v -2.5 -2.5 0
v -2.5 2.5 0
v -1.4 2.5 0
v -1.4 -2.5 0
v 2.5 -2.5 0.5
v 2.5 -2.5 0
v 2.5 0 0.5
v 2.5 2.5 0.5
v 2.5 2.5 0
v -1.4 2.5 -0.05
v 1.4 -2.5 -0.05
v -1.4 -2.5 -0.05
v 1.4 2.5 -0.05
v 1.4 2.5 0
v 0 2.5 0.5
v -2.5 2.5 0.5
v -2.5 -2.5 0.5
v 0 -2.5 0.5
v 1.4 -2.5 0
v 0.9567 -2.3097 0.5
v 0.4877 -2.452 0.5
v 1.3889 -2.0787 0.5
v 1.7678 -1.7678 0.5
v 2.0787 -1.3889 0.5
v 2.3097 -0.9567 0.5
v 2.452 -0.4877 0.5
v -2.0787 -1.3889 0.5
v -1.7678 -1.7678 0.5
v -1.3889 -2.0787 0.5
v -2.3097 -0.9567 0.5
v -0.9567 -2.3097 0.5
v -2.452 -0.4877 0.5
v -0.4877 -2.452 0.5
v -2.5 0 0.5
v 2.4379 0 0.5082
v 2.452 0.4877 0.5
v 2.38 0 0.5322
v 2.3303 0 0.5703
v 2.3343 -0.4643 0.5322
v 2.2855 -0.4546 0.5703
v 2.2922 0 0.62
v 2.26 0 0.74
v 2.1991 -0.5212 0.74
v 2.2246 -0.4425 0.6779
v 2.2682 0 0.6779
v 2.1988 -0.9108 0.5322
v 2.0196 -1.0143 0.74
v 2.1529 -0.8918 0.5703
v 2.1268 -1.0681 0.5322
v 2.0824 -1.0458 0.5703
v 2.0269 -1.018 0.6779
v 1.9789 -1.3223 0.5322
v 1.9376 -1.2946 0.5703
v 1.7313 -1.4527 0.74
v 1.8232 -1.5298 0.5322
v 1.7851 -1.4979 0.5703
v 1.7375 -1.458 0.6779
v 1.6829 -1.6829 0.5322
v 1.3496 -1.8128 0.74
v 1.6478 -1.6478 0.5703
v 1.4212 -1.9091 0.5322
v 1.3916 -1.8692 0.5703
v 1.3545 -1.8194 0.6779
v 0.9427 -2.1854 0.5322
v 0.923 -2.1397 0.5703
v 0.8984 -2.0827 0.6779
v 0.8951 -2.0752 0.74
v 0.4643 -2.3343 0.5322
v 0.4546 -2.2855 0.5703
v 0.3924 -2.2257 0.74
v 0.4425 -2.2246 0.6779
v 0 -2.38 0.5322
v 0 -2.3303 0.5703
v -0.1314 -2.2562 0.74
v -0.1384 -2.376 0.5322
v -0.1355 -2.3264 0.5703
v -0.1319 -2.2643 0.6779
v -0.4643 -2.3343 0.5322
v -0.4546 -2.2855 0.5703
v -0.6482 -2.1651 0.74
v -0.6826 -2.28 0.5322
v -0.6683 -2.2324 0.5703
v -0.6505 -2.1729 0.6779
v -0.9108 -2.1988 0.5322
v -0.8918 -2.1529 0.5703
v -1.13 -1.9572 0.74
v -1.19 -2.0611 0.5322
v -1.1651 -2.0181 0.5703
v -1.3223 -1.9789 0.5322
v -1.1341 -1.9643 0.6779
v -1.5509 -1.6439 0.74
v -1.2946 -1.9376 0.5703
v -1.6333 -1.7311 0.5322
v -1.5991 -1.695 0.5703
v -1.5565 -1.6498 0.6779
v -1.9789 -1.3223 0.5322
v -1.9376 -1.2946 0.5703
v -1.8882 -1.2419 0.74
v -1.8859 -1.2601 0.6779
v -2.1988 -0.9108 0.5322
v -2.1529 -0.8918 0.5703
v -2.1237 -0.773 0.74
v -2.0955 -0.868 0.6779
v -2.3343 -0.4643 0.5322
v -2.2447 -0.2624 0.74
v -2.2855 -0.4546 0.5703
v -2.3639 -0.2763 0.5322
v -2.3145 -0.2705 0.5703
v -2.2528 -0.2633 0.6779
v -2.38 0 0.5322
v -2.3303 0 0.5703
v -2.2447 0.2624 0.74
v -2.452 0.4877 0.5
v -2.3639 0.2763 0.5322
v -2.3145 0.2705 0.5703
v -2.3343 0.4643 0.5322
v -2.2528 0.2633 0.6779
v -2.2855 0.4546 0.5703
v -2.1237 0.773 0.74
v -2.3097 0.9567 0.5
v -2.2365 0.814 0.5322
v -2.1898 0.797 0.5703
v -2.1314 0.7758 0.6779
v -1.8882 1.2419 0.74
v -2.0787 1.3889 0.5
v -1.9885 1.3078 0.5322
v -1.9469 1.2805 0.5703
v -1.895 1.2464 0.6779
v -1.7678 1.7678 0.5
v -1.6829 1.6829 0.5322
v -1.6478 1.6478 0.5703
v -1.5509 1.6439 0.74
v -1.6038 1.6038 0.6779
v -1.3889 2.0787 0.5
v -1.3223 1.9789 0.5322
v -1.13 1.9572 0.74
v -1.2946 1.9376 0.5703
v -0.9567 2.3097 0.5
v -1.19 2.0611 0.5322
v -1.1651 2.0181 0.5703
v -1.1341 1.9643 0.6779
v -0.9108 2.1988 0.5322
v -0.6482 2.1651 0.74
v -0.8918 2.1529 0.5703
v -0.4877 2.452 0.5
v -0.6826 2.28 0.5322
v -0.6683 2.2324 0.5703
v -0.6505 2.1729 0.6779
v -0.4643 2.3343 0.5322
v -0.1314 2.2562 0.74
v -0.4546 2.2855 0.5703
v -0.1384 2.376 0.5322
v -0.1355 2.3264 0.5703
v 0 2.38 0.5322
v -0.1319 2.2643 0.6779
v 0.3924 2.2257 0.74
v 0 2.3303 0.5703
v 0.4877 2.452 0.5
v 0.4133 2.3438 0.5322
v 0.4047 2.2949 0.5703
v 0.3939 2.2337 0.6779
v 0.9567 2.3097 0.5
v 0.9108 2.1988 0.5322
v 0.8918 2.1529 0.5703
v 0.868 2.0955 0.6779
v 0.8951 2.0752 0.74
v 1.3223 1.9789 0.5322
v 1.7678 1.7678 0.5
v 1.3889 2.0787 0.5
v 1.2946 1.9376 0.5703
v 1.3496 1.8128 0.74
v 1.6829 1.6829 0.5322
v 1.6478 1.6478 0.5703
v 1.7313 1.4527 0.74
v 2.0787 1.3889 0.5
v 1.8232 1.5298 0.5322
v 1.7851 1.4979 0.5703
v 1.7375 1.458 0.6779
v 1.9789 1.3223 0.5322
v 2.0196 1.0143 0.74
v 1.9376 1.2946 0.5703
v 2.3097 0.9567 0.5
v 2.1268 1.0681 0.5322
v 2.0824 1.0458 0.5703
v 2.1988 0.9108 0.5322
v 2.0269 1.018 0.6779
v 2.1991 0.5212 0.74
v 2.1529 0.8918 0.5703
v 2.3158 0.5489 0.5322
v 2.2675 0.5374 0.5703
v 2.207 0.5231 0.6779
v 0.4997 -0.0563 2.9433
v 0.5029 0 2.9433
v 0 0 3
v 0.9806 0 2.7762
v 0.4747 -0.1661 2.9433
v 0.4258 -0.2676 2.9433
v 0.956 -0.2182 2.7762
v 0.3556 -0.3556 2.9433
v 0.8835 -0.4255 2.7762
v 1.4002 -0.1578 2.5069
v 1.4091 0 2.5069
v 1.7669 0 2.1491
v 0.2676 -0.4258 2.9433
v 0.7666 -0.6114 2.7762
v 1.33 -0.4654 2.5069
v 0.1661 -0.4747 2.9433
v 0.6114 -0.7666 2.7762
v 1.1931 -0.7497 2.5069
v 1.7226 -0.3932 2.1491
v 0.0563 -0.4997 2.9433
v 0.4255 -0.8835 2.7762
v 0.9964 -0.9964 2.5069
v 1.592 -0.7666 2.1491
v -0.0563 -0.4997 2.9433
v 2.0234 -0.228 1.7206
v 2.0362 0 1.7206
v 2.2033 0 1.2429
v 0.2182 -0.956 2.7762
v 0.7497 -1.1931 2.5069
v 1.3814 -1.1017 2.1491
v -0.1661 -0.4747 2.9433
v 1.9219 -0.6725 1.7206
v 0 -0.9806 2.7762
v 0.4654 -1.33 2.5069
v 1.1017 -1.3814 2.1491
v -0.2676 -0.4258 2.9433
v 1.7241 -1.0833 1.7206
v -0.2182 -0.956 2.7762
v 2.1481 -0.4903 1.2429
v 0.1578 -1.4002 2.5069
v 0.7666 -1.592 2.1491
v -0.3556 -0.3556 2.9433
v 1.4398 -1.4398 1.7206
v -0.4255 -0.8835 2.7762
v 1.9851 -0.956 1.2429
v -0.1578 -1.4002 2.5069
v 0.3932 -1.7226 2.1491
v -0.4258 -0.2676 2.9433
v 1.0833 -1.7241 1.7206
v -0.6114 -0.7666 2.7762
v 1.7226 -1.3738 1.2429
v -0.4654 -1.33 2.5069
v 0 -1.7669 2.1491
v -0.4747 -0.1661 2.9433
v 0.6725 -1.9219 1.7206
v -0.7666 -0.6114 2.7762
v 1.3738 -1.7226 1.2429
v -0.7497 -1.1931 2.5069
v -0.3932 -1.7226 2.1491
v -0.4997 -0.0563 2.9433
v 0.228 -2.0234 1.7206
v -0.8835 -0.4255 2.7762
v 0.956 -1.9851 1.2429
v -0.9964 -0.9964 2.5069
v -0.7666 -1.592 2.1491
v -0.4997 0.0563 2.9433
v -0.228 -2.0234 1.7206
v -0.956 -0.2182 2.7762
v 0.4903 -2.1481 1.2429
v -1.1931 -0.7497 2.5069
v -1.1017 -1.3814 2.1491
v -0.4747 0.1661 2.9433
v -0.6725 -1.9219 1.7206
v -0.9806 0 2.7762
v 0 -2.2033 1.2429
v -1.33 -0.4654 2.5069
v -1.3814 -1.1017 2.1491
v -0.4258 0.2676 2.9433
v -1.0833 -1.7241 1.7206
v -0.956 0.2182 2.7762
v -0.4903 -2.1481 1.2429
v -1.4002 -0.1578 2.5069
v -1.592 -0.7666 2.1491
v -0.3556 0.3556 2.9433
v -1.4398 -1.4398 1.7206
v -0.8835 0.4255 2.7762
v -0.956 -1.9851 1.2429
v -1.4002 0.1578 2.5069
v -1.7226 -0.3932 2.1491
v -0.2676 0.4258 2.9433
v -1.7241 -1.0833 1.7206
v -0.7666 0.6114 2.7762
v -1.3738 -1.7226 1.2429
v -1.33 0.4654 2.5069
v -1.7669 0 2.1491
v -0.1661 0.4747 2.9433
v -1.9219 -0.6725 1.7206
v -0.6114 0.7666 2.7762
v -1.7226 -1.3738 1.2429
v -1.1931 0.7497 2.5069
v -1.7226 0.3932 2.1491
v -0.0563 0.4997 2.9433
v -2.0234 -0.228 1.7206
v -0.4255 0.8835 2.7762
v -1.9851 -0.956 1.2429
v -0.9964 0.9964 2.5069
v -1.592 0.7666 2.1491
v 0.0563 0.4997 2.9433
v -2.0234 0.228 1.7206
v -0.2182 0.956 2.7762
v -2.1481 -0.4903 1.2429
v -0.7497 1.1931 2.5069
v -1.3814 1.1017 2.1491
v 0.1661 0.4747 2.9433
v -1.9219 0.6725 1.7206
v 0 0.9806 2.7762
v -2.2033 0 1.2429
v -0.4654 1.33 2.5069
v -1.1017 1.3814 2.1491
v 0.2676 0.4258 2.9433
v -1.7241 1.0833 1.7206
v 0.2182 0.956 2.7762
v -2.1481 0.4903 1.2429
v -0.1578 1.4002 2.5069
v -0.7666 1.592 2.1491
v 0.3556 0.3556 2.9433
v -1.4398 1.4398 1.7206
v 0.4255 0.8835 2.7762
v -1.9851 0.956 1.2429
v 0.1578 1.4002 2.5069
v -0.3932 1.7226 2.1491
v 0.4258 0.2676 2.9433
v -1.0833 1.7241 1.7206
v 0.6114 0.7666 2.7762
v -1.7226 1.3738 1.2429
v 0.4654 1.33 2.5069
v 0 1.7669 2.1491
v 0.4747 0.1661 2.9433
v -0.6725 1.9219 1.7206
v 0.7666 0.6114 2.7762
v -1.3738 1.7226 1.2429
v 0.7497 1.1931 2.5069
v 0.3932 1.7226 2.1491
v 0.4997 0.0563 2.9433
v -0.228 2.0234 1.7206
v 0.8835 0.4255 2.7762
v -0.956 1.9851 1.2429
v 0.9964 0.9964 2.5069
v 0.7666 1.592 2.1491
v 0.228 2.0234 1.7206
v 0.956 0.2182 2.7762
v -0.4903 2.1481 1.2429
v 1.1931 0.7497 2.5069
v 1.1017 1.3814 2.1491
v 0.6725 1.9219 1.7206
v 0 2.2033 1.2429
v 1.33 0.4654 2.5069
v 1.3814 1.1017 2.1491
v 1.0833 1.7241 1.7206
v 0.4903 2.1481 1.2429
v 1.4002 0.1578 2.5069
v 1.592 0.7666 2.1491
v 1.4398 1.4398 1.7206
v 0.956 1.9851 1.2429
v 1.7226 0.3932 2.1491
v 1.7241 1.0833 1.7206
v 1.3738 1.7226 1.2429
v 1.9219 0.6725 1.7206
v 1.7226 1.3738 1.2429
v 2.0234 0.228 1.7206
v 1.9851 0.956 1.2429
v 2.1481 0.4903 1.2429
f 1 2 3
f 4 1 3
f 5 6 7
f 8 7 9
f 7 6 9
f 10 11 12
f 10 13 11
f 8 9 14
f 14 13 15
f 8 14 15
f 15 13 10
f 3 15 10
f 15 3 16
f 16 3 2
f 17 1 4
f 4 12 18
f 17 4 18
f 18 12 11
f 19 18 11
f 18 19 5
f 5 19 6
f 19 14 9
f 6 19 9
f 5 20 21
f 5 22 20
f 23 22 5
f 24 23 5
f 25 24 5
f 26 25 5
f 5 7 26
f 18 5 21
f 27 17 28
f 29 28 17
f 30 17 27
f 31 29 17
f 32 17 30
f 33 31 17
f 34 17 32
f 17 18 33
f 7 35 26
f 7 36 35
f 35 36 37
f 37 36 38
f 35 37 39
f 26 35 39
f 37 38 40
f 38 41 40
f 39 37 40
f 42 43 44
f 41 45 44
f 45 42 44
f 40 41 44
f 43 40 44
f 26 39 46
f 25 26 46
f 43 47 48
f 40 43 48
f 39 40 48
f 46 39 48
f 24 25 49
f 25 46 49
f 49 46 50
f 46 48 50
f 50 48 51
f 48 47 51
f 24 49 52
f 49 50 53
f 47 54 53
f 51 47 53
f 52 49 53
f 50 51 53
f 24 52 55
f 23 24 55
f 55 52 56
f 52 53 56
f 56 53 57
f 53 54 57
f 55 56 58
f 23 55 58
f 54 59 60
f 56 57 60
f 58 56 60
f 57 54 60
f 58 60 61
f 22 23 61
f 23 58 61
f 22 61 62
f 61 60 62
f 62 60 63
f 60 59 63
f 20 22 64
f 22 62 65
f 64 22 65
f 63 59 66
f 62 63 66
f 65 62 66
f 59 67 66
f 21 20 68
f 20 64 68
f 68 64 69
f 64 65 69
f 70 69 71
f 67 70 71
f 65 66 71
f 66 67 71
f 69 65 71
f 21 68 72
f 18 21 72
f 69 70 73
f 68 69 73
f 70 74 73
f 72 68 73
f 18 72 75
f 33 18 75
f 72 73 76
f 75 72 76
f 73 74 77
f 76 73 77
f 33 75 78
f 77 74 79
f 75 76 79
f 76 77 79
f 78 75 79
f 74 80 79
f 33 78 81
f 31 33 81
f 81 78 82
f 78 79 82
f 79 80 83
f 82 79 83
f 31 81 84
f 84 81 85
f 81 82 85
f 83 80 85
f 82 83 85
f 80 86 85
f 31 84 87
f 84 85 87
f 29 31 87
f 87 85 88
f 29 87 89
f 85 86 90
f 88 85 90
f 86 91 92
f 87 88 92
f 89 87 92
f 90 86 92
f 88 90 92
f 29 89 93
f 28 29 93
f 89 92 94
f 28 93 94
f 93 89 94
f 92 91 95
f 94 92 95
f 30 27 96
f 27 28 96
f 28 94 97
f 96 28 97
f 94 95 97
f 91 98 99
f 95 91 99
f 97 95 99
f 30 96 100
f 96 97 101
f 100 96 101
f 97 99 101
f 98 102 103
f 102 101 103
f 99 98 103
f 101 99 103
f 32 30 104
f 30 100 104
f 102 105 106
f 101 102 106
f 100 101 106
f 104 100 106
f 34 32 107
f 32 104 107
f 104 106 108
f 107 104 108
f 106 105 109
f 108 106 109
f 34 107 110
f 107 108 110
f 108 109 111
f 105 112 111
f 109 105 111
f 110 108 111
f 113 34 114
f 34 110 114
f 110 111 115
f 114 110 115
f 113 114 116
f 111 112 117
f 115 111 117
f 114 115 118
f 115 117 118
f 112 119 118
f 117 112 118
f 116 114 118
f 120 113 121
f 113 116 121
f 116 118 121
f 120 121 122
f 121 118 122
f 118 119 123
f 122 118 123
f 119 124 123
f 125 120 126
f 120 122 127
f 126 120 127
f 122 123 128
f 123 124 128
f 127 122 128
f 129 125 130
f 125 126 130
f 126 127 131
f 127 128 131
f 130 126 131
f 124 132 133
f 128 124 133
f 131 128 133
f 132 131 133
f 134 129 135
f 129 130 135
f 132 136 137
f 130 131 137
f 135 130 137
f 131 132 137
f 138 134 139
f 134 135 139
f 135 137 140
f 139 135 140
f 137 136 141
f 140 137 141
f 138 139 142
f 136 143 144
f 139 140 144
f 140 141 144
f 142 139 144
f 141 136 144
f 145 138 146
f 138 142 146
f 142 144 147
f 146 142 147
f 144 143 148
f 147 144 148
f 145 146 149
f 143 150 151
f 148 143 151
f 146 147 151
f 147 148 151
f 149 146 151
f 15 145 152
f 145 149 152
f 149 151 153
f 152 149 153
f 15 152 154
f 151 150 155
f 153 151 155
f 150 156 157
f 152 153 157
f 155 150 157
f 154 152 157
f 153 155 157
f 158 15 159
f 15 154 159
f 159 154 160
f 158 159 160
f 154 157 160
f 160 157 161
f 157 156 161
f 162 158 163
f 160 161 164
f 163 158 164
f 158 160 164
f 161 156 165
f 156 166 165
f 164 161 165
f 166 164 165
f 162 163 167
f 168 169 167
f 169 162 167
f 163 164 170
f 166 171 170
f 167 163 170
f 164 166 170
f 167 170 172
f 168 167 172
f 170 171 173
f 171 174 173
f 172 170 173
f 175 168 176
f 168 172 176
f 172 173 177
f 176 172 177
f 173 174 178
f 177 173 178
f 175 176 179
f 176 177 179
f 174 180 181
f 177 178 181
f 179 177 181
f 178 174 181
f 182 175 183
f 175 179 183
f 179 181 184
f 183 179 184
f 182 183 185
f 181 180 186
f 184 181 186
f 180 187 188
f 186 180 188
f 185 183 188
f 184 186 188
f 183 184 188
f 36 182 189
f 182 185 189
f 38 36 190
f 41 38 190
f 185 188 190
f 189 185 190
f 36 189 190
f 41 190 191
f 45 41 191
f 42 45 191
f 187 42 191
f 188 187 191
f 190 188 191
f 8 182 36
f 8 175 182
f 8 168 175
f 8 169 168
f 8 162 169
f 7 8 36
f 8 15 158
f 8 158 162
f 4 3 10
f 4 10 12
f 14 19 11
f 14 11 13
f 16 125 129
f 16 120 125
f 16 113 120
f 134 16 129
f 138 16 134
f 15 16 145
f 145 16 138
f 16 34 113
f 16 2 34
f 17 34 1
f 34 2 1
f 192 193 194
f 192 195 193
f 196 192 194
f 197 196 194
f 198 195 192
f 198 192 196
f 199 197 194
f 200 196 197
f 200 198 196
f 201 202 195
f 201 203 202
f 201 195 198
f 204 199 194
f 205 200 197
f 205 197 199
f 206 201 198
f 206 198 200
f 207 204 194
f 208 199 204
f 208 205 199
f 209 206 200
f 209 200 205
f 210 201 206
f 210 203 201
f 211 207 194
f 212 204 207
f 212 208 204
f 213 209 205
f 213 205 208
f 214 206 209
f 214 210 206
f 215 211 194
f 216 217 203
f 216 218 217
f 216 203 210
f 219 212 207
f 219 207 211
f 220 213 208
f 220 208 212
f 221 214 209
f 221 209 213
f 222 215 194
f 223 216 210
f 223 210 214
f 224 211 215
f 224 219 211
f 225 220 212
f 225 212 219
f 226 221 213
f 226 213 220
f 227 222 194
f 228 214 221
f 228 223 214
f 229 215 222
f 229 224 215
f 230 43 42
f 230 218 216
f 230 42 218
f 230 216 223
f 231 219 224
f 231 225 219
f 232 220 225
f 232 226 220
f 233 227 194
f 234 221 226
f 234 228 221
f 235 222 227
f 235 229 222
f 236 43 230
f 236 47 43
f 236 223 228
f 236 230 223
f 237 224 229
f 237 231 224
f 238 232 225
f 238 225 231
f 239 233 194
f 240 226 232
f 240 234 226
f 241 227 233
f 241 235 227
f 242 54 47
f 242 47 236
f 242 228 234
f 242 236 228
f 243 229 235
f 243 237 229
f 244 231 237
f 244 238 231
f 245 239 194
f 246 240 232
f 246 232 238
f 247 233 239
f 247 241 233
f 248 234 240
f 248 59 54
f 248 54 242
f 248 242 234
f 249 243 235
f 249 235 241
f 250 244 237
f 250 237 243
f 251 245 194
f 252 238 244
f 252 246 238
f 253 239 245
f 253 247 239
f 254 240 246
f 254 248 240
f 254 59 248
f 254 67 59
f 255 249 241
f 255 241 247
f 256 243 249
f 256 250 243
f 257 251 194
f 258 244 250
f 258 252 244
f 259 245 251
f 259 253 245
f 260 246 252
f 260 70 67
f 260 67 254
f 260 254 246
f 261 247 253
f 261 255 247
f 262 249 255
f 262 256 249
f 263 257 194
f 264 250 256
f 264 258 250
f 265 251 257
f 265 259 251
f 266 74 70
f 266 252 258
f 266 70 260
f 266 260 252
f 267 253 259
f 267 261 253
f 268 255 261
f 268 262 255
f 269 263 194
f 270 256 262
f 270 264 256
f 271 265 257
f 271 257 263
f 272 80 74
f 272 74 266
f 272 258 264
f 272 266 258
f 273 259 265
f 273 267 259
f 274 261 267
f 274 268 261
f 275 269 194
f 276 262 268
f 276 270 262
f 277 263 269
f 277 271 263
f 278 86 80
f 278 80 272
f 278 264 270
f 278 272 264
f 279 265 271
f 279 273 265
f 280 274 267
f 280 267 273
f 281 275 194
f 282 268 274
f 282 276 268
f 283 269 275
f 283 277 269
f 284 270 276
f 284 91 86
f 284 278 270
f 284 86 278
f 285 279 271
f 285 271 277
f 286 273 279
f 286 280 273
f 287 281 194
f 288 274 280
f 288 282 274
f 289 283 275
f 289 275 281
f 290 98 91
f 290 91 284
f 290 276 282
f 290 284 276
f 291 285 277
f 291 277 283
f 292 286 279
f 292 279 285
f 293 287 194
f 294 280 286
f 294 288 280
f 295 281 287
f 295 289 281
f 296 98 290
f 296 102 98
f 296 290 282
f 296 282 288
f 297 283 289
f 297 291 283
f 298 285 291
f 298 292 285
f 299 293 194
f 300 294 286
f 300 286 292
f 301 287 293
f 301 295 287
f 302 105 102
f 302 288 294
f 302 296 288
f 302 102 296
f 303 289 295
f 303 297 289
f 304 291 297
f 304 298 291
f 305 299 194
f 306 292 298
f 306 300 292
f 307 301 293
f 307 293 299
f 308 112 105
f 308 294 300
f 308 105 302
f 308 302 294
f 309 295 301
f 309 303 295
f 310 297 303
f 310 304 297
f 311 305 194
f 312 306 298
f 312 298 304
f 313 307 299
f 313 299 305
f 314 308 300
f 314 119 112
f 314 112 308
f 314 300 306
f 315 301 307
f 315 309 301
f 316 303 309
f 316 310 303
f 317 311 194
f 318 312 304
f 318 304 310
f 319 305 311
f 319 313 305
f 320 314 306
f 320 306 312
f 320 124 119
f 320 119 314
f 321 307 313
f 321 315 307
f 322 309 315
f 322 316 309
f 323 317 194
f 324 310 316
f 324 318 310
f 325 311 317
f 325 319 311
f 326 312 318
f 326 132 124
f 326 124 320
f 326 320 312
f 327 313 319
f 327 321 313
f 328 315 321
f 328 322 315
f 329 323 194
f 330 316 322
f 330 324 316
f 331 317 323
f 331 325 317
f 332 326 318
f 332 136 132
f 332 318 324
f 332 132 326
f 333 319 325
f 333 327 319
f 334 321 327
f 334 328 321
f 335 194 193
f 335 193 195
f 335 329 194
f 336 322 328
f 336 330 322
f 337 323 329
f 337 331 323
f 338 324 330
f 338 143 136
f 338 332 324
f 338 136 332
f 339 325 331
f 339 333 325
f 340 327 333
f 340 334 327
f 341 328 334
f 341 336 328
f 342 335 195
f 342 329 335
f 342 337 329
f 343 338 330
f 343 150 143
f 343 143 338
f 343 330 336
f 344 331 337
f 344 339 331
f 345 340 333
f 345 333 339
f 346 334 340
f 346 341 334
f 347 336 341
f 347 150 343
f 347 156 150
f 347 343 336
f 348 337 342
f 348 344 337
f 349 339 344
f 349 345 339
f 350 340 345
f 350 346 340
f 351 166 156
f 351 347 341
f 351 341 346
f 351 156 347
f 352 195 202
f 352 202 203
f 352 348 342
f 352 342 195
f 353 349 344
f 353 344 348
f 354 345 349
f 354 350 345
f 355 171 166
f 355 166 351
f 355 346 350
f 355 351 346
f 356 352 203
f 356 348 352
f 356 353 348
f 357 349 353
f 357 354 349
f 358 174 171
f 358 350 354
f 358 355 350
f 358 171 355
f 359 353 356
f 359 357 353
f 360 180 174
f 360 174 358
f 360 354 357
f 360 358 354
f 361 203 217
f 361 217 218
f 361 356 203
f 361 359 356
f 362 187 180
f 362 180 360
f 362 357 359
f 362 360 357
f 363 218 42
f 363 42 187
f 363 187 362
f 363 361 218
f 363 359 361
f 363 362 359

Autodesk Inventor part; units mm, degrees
ref_plane "YZ Plane" through (0, 0, 0) normal (1, 0, 0) x (0, 1, 0)
ref_plane "XZ Plane" through (0, 0, 0) normal (0, 1, 0) x (-1, 0, 0)
ref_plane "XY Plane" through (0, 0, 0) normal (0, 0, 1) x (1, 0, 0)
sketch "Skizze1" plane through (0, 0, 0) normal (0, 0, 1) x (1, 0, 0)
  line L0 (-2.5, -2.5) -> (2.5, -2.5)
  line L1 (2.5, -2.5) -> (2.5, 2.5)
  line L2 (2.5, 2.5) -> (-2.5, 2.5)
  line L3 (-2.5, 2.5) -> (-2.5, -2.5)
  line L4 (-2.5, -2.5) -> (2.5, 2.5) construction
  line L5 (2.5, -2.5) -> (-2.5, 2.5) construction
  point P0 (0, 0)
  dimension "d0" = 5
  dimension "d1" = 5
extrude "Extrusion1" add sketch "Skizze1" along normal blind 0.5
sketch "Skizze2" plane through (0, 0, 0) normal (0, 1, 0) x (-1, 0, 0)
  line L0 (2.5, 0) -> (-2.5, 0) projected
  line L1 (-2.5, 0) -> (-2.5, 0.5) projected
  line L2 (2.5, 0.5) -> (-2.5, 0.5) projected
  line L3 (2.5, 0) -> (2.5, 0.5) projected
  line L4 (0, 0.5) -> (0, 3)
  arc A0 (0, 3) -> (-2.26, 0.74) centre (0, 0.74) ccw
  line L5 (-2.5, 0.5) -> (2.5, 0.5) projected
  arc A1 (-2.5, 0.5) -> (-2.26, 0.74) centre (-2.5, 0.74) ccw
  line L6 (0, 0.5) -> (-2.5, 0.5)
  line L7 (0, -0.6936) -> (0, 4.1617) projected
  point P0 (0, 0)
  dimension "d4" = 2.26
  dimension "d5" = 3
revolve "Umdrehung1" add sketch "Skizze2" angle 360 about axis through (0, 0, -10) along (0, 0, 1) contours L2 A1 A0 L4
sketch "Skizze3" plane through (0, 0, 0) normal (0, 0, -1) x (-1, 0, 0)
  line L0 (2.5, -2.5) -> (-2.5, -2.5) projected
  line L1 (2.5, 2.5) -> (2.5, -2.5) projected
  line L2 (-2.5, 2.5) -> (2.5, 2.5) projected
  line L3 (-2.5, -2.5) -> (-2.5, 2.5) projected
  line L4 (2.5, -2.5) -> (-2.5, -2.5) projected
  line L5 (-2.5, 2.5) -> (2.5, 2.5) projected
  line L6 (1.4, -2.5) -> (-1.4, -2.5)
  line L7 (-1.4, -2.5) -> (-1.4, 2.5)
  line L8 (-1.4, 2.5) -> (1.4, 2.5)
  line L9 (1.4, 2.5) -> (1.4, -2.5)
  line L10 (0, -2.5) -> (0, 2.5) construction
  point P0 (0, 0)
  dimension "d7" = 2.8
extrude "Extrusion2" add sketch "Skizze3" along normal blind 0.05 contours L0 L7 L2 L9
properties part number "CREE XLamp 1W 5x5"
